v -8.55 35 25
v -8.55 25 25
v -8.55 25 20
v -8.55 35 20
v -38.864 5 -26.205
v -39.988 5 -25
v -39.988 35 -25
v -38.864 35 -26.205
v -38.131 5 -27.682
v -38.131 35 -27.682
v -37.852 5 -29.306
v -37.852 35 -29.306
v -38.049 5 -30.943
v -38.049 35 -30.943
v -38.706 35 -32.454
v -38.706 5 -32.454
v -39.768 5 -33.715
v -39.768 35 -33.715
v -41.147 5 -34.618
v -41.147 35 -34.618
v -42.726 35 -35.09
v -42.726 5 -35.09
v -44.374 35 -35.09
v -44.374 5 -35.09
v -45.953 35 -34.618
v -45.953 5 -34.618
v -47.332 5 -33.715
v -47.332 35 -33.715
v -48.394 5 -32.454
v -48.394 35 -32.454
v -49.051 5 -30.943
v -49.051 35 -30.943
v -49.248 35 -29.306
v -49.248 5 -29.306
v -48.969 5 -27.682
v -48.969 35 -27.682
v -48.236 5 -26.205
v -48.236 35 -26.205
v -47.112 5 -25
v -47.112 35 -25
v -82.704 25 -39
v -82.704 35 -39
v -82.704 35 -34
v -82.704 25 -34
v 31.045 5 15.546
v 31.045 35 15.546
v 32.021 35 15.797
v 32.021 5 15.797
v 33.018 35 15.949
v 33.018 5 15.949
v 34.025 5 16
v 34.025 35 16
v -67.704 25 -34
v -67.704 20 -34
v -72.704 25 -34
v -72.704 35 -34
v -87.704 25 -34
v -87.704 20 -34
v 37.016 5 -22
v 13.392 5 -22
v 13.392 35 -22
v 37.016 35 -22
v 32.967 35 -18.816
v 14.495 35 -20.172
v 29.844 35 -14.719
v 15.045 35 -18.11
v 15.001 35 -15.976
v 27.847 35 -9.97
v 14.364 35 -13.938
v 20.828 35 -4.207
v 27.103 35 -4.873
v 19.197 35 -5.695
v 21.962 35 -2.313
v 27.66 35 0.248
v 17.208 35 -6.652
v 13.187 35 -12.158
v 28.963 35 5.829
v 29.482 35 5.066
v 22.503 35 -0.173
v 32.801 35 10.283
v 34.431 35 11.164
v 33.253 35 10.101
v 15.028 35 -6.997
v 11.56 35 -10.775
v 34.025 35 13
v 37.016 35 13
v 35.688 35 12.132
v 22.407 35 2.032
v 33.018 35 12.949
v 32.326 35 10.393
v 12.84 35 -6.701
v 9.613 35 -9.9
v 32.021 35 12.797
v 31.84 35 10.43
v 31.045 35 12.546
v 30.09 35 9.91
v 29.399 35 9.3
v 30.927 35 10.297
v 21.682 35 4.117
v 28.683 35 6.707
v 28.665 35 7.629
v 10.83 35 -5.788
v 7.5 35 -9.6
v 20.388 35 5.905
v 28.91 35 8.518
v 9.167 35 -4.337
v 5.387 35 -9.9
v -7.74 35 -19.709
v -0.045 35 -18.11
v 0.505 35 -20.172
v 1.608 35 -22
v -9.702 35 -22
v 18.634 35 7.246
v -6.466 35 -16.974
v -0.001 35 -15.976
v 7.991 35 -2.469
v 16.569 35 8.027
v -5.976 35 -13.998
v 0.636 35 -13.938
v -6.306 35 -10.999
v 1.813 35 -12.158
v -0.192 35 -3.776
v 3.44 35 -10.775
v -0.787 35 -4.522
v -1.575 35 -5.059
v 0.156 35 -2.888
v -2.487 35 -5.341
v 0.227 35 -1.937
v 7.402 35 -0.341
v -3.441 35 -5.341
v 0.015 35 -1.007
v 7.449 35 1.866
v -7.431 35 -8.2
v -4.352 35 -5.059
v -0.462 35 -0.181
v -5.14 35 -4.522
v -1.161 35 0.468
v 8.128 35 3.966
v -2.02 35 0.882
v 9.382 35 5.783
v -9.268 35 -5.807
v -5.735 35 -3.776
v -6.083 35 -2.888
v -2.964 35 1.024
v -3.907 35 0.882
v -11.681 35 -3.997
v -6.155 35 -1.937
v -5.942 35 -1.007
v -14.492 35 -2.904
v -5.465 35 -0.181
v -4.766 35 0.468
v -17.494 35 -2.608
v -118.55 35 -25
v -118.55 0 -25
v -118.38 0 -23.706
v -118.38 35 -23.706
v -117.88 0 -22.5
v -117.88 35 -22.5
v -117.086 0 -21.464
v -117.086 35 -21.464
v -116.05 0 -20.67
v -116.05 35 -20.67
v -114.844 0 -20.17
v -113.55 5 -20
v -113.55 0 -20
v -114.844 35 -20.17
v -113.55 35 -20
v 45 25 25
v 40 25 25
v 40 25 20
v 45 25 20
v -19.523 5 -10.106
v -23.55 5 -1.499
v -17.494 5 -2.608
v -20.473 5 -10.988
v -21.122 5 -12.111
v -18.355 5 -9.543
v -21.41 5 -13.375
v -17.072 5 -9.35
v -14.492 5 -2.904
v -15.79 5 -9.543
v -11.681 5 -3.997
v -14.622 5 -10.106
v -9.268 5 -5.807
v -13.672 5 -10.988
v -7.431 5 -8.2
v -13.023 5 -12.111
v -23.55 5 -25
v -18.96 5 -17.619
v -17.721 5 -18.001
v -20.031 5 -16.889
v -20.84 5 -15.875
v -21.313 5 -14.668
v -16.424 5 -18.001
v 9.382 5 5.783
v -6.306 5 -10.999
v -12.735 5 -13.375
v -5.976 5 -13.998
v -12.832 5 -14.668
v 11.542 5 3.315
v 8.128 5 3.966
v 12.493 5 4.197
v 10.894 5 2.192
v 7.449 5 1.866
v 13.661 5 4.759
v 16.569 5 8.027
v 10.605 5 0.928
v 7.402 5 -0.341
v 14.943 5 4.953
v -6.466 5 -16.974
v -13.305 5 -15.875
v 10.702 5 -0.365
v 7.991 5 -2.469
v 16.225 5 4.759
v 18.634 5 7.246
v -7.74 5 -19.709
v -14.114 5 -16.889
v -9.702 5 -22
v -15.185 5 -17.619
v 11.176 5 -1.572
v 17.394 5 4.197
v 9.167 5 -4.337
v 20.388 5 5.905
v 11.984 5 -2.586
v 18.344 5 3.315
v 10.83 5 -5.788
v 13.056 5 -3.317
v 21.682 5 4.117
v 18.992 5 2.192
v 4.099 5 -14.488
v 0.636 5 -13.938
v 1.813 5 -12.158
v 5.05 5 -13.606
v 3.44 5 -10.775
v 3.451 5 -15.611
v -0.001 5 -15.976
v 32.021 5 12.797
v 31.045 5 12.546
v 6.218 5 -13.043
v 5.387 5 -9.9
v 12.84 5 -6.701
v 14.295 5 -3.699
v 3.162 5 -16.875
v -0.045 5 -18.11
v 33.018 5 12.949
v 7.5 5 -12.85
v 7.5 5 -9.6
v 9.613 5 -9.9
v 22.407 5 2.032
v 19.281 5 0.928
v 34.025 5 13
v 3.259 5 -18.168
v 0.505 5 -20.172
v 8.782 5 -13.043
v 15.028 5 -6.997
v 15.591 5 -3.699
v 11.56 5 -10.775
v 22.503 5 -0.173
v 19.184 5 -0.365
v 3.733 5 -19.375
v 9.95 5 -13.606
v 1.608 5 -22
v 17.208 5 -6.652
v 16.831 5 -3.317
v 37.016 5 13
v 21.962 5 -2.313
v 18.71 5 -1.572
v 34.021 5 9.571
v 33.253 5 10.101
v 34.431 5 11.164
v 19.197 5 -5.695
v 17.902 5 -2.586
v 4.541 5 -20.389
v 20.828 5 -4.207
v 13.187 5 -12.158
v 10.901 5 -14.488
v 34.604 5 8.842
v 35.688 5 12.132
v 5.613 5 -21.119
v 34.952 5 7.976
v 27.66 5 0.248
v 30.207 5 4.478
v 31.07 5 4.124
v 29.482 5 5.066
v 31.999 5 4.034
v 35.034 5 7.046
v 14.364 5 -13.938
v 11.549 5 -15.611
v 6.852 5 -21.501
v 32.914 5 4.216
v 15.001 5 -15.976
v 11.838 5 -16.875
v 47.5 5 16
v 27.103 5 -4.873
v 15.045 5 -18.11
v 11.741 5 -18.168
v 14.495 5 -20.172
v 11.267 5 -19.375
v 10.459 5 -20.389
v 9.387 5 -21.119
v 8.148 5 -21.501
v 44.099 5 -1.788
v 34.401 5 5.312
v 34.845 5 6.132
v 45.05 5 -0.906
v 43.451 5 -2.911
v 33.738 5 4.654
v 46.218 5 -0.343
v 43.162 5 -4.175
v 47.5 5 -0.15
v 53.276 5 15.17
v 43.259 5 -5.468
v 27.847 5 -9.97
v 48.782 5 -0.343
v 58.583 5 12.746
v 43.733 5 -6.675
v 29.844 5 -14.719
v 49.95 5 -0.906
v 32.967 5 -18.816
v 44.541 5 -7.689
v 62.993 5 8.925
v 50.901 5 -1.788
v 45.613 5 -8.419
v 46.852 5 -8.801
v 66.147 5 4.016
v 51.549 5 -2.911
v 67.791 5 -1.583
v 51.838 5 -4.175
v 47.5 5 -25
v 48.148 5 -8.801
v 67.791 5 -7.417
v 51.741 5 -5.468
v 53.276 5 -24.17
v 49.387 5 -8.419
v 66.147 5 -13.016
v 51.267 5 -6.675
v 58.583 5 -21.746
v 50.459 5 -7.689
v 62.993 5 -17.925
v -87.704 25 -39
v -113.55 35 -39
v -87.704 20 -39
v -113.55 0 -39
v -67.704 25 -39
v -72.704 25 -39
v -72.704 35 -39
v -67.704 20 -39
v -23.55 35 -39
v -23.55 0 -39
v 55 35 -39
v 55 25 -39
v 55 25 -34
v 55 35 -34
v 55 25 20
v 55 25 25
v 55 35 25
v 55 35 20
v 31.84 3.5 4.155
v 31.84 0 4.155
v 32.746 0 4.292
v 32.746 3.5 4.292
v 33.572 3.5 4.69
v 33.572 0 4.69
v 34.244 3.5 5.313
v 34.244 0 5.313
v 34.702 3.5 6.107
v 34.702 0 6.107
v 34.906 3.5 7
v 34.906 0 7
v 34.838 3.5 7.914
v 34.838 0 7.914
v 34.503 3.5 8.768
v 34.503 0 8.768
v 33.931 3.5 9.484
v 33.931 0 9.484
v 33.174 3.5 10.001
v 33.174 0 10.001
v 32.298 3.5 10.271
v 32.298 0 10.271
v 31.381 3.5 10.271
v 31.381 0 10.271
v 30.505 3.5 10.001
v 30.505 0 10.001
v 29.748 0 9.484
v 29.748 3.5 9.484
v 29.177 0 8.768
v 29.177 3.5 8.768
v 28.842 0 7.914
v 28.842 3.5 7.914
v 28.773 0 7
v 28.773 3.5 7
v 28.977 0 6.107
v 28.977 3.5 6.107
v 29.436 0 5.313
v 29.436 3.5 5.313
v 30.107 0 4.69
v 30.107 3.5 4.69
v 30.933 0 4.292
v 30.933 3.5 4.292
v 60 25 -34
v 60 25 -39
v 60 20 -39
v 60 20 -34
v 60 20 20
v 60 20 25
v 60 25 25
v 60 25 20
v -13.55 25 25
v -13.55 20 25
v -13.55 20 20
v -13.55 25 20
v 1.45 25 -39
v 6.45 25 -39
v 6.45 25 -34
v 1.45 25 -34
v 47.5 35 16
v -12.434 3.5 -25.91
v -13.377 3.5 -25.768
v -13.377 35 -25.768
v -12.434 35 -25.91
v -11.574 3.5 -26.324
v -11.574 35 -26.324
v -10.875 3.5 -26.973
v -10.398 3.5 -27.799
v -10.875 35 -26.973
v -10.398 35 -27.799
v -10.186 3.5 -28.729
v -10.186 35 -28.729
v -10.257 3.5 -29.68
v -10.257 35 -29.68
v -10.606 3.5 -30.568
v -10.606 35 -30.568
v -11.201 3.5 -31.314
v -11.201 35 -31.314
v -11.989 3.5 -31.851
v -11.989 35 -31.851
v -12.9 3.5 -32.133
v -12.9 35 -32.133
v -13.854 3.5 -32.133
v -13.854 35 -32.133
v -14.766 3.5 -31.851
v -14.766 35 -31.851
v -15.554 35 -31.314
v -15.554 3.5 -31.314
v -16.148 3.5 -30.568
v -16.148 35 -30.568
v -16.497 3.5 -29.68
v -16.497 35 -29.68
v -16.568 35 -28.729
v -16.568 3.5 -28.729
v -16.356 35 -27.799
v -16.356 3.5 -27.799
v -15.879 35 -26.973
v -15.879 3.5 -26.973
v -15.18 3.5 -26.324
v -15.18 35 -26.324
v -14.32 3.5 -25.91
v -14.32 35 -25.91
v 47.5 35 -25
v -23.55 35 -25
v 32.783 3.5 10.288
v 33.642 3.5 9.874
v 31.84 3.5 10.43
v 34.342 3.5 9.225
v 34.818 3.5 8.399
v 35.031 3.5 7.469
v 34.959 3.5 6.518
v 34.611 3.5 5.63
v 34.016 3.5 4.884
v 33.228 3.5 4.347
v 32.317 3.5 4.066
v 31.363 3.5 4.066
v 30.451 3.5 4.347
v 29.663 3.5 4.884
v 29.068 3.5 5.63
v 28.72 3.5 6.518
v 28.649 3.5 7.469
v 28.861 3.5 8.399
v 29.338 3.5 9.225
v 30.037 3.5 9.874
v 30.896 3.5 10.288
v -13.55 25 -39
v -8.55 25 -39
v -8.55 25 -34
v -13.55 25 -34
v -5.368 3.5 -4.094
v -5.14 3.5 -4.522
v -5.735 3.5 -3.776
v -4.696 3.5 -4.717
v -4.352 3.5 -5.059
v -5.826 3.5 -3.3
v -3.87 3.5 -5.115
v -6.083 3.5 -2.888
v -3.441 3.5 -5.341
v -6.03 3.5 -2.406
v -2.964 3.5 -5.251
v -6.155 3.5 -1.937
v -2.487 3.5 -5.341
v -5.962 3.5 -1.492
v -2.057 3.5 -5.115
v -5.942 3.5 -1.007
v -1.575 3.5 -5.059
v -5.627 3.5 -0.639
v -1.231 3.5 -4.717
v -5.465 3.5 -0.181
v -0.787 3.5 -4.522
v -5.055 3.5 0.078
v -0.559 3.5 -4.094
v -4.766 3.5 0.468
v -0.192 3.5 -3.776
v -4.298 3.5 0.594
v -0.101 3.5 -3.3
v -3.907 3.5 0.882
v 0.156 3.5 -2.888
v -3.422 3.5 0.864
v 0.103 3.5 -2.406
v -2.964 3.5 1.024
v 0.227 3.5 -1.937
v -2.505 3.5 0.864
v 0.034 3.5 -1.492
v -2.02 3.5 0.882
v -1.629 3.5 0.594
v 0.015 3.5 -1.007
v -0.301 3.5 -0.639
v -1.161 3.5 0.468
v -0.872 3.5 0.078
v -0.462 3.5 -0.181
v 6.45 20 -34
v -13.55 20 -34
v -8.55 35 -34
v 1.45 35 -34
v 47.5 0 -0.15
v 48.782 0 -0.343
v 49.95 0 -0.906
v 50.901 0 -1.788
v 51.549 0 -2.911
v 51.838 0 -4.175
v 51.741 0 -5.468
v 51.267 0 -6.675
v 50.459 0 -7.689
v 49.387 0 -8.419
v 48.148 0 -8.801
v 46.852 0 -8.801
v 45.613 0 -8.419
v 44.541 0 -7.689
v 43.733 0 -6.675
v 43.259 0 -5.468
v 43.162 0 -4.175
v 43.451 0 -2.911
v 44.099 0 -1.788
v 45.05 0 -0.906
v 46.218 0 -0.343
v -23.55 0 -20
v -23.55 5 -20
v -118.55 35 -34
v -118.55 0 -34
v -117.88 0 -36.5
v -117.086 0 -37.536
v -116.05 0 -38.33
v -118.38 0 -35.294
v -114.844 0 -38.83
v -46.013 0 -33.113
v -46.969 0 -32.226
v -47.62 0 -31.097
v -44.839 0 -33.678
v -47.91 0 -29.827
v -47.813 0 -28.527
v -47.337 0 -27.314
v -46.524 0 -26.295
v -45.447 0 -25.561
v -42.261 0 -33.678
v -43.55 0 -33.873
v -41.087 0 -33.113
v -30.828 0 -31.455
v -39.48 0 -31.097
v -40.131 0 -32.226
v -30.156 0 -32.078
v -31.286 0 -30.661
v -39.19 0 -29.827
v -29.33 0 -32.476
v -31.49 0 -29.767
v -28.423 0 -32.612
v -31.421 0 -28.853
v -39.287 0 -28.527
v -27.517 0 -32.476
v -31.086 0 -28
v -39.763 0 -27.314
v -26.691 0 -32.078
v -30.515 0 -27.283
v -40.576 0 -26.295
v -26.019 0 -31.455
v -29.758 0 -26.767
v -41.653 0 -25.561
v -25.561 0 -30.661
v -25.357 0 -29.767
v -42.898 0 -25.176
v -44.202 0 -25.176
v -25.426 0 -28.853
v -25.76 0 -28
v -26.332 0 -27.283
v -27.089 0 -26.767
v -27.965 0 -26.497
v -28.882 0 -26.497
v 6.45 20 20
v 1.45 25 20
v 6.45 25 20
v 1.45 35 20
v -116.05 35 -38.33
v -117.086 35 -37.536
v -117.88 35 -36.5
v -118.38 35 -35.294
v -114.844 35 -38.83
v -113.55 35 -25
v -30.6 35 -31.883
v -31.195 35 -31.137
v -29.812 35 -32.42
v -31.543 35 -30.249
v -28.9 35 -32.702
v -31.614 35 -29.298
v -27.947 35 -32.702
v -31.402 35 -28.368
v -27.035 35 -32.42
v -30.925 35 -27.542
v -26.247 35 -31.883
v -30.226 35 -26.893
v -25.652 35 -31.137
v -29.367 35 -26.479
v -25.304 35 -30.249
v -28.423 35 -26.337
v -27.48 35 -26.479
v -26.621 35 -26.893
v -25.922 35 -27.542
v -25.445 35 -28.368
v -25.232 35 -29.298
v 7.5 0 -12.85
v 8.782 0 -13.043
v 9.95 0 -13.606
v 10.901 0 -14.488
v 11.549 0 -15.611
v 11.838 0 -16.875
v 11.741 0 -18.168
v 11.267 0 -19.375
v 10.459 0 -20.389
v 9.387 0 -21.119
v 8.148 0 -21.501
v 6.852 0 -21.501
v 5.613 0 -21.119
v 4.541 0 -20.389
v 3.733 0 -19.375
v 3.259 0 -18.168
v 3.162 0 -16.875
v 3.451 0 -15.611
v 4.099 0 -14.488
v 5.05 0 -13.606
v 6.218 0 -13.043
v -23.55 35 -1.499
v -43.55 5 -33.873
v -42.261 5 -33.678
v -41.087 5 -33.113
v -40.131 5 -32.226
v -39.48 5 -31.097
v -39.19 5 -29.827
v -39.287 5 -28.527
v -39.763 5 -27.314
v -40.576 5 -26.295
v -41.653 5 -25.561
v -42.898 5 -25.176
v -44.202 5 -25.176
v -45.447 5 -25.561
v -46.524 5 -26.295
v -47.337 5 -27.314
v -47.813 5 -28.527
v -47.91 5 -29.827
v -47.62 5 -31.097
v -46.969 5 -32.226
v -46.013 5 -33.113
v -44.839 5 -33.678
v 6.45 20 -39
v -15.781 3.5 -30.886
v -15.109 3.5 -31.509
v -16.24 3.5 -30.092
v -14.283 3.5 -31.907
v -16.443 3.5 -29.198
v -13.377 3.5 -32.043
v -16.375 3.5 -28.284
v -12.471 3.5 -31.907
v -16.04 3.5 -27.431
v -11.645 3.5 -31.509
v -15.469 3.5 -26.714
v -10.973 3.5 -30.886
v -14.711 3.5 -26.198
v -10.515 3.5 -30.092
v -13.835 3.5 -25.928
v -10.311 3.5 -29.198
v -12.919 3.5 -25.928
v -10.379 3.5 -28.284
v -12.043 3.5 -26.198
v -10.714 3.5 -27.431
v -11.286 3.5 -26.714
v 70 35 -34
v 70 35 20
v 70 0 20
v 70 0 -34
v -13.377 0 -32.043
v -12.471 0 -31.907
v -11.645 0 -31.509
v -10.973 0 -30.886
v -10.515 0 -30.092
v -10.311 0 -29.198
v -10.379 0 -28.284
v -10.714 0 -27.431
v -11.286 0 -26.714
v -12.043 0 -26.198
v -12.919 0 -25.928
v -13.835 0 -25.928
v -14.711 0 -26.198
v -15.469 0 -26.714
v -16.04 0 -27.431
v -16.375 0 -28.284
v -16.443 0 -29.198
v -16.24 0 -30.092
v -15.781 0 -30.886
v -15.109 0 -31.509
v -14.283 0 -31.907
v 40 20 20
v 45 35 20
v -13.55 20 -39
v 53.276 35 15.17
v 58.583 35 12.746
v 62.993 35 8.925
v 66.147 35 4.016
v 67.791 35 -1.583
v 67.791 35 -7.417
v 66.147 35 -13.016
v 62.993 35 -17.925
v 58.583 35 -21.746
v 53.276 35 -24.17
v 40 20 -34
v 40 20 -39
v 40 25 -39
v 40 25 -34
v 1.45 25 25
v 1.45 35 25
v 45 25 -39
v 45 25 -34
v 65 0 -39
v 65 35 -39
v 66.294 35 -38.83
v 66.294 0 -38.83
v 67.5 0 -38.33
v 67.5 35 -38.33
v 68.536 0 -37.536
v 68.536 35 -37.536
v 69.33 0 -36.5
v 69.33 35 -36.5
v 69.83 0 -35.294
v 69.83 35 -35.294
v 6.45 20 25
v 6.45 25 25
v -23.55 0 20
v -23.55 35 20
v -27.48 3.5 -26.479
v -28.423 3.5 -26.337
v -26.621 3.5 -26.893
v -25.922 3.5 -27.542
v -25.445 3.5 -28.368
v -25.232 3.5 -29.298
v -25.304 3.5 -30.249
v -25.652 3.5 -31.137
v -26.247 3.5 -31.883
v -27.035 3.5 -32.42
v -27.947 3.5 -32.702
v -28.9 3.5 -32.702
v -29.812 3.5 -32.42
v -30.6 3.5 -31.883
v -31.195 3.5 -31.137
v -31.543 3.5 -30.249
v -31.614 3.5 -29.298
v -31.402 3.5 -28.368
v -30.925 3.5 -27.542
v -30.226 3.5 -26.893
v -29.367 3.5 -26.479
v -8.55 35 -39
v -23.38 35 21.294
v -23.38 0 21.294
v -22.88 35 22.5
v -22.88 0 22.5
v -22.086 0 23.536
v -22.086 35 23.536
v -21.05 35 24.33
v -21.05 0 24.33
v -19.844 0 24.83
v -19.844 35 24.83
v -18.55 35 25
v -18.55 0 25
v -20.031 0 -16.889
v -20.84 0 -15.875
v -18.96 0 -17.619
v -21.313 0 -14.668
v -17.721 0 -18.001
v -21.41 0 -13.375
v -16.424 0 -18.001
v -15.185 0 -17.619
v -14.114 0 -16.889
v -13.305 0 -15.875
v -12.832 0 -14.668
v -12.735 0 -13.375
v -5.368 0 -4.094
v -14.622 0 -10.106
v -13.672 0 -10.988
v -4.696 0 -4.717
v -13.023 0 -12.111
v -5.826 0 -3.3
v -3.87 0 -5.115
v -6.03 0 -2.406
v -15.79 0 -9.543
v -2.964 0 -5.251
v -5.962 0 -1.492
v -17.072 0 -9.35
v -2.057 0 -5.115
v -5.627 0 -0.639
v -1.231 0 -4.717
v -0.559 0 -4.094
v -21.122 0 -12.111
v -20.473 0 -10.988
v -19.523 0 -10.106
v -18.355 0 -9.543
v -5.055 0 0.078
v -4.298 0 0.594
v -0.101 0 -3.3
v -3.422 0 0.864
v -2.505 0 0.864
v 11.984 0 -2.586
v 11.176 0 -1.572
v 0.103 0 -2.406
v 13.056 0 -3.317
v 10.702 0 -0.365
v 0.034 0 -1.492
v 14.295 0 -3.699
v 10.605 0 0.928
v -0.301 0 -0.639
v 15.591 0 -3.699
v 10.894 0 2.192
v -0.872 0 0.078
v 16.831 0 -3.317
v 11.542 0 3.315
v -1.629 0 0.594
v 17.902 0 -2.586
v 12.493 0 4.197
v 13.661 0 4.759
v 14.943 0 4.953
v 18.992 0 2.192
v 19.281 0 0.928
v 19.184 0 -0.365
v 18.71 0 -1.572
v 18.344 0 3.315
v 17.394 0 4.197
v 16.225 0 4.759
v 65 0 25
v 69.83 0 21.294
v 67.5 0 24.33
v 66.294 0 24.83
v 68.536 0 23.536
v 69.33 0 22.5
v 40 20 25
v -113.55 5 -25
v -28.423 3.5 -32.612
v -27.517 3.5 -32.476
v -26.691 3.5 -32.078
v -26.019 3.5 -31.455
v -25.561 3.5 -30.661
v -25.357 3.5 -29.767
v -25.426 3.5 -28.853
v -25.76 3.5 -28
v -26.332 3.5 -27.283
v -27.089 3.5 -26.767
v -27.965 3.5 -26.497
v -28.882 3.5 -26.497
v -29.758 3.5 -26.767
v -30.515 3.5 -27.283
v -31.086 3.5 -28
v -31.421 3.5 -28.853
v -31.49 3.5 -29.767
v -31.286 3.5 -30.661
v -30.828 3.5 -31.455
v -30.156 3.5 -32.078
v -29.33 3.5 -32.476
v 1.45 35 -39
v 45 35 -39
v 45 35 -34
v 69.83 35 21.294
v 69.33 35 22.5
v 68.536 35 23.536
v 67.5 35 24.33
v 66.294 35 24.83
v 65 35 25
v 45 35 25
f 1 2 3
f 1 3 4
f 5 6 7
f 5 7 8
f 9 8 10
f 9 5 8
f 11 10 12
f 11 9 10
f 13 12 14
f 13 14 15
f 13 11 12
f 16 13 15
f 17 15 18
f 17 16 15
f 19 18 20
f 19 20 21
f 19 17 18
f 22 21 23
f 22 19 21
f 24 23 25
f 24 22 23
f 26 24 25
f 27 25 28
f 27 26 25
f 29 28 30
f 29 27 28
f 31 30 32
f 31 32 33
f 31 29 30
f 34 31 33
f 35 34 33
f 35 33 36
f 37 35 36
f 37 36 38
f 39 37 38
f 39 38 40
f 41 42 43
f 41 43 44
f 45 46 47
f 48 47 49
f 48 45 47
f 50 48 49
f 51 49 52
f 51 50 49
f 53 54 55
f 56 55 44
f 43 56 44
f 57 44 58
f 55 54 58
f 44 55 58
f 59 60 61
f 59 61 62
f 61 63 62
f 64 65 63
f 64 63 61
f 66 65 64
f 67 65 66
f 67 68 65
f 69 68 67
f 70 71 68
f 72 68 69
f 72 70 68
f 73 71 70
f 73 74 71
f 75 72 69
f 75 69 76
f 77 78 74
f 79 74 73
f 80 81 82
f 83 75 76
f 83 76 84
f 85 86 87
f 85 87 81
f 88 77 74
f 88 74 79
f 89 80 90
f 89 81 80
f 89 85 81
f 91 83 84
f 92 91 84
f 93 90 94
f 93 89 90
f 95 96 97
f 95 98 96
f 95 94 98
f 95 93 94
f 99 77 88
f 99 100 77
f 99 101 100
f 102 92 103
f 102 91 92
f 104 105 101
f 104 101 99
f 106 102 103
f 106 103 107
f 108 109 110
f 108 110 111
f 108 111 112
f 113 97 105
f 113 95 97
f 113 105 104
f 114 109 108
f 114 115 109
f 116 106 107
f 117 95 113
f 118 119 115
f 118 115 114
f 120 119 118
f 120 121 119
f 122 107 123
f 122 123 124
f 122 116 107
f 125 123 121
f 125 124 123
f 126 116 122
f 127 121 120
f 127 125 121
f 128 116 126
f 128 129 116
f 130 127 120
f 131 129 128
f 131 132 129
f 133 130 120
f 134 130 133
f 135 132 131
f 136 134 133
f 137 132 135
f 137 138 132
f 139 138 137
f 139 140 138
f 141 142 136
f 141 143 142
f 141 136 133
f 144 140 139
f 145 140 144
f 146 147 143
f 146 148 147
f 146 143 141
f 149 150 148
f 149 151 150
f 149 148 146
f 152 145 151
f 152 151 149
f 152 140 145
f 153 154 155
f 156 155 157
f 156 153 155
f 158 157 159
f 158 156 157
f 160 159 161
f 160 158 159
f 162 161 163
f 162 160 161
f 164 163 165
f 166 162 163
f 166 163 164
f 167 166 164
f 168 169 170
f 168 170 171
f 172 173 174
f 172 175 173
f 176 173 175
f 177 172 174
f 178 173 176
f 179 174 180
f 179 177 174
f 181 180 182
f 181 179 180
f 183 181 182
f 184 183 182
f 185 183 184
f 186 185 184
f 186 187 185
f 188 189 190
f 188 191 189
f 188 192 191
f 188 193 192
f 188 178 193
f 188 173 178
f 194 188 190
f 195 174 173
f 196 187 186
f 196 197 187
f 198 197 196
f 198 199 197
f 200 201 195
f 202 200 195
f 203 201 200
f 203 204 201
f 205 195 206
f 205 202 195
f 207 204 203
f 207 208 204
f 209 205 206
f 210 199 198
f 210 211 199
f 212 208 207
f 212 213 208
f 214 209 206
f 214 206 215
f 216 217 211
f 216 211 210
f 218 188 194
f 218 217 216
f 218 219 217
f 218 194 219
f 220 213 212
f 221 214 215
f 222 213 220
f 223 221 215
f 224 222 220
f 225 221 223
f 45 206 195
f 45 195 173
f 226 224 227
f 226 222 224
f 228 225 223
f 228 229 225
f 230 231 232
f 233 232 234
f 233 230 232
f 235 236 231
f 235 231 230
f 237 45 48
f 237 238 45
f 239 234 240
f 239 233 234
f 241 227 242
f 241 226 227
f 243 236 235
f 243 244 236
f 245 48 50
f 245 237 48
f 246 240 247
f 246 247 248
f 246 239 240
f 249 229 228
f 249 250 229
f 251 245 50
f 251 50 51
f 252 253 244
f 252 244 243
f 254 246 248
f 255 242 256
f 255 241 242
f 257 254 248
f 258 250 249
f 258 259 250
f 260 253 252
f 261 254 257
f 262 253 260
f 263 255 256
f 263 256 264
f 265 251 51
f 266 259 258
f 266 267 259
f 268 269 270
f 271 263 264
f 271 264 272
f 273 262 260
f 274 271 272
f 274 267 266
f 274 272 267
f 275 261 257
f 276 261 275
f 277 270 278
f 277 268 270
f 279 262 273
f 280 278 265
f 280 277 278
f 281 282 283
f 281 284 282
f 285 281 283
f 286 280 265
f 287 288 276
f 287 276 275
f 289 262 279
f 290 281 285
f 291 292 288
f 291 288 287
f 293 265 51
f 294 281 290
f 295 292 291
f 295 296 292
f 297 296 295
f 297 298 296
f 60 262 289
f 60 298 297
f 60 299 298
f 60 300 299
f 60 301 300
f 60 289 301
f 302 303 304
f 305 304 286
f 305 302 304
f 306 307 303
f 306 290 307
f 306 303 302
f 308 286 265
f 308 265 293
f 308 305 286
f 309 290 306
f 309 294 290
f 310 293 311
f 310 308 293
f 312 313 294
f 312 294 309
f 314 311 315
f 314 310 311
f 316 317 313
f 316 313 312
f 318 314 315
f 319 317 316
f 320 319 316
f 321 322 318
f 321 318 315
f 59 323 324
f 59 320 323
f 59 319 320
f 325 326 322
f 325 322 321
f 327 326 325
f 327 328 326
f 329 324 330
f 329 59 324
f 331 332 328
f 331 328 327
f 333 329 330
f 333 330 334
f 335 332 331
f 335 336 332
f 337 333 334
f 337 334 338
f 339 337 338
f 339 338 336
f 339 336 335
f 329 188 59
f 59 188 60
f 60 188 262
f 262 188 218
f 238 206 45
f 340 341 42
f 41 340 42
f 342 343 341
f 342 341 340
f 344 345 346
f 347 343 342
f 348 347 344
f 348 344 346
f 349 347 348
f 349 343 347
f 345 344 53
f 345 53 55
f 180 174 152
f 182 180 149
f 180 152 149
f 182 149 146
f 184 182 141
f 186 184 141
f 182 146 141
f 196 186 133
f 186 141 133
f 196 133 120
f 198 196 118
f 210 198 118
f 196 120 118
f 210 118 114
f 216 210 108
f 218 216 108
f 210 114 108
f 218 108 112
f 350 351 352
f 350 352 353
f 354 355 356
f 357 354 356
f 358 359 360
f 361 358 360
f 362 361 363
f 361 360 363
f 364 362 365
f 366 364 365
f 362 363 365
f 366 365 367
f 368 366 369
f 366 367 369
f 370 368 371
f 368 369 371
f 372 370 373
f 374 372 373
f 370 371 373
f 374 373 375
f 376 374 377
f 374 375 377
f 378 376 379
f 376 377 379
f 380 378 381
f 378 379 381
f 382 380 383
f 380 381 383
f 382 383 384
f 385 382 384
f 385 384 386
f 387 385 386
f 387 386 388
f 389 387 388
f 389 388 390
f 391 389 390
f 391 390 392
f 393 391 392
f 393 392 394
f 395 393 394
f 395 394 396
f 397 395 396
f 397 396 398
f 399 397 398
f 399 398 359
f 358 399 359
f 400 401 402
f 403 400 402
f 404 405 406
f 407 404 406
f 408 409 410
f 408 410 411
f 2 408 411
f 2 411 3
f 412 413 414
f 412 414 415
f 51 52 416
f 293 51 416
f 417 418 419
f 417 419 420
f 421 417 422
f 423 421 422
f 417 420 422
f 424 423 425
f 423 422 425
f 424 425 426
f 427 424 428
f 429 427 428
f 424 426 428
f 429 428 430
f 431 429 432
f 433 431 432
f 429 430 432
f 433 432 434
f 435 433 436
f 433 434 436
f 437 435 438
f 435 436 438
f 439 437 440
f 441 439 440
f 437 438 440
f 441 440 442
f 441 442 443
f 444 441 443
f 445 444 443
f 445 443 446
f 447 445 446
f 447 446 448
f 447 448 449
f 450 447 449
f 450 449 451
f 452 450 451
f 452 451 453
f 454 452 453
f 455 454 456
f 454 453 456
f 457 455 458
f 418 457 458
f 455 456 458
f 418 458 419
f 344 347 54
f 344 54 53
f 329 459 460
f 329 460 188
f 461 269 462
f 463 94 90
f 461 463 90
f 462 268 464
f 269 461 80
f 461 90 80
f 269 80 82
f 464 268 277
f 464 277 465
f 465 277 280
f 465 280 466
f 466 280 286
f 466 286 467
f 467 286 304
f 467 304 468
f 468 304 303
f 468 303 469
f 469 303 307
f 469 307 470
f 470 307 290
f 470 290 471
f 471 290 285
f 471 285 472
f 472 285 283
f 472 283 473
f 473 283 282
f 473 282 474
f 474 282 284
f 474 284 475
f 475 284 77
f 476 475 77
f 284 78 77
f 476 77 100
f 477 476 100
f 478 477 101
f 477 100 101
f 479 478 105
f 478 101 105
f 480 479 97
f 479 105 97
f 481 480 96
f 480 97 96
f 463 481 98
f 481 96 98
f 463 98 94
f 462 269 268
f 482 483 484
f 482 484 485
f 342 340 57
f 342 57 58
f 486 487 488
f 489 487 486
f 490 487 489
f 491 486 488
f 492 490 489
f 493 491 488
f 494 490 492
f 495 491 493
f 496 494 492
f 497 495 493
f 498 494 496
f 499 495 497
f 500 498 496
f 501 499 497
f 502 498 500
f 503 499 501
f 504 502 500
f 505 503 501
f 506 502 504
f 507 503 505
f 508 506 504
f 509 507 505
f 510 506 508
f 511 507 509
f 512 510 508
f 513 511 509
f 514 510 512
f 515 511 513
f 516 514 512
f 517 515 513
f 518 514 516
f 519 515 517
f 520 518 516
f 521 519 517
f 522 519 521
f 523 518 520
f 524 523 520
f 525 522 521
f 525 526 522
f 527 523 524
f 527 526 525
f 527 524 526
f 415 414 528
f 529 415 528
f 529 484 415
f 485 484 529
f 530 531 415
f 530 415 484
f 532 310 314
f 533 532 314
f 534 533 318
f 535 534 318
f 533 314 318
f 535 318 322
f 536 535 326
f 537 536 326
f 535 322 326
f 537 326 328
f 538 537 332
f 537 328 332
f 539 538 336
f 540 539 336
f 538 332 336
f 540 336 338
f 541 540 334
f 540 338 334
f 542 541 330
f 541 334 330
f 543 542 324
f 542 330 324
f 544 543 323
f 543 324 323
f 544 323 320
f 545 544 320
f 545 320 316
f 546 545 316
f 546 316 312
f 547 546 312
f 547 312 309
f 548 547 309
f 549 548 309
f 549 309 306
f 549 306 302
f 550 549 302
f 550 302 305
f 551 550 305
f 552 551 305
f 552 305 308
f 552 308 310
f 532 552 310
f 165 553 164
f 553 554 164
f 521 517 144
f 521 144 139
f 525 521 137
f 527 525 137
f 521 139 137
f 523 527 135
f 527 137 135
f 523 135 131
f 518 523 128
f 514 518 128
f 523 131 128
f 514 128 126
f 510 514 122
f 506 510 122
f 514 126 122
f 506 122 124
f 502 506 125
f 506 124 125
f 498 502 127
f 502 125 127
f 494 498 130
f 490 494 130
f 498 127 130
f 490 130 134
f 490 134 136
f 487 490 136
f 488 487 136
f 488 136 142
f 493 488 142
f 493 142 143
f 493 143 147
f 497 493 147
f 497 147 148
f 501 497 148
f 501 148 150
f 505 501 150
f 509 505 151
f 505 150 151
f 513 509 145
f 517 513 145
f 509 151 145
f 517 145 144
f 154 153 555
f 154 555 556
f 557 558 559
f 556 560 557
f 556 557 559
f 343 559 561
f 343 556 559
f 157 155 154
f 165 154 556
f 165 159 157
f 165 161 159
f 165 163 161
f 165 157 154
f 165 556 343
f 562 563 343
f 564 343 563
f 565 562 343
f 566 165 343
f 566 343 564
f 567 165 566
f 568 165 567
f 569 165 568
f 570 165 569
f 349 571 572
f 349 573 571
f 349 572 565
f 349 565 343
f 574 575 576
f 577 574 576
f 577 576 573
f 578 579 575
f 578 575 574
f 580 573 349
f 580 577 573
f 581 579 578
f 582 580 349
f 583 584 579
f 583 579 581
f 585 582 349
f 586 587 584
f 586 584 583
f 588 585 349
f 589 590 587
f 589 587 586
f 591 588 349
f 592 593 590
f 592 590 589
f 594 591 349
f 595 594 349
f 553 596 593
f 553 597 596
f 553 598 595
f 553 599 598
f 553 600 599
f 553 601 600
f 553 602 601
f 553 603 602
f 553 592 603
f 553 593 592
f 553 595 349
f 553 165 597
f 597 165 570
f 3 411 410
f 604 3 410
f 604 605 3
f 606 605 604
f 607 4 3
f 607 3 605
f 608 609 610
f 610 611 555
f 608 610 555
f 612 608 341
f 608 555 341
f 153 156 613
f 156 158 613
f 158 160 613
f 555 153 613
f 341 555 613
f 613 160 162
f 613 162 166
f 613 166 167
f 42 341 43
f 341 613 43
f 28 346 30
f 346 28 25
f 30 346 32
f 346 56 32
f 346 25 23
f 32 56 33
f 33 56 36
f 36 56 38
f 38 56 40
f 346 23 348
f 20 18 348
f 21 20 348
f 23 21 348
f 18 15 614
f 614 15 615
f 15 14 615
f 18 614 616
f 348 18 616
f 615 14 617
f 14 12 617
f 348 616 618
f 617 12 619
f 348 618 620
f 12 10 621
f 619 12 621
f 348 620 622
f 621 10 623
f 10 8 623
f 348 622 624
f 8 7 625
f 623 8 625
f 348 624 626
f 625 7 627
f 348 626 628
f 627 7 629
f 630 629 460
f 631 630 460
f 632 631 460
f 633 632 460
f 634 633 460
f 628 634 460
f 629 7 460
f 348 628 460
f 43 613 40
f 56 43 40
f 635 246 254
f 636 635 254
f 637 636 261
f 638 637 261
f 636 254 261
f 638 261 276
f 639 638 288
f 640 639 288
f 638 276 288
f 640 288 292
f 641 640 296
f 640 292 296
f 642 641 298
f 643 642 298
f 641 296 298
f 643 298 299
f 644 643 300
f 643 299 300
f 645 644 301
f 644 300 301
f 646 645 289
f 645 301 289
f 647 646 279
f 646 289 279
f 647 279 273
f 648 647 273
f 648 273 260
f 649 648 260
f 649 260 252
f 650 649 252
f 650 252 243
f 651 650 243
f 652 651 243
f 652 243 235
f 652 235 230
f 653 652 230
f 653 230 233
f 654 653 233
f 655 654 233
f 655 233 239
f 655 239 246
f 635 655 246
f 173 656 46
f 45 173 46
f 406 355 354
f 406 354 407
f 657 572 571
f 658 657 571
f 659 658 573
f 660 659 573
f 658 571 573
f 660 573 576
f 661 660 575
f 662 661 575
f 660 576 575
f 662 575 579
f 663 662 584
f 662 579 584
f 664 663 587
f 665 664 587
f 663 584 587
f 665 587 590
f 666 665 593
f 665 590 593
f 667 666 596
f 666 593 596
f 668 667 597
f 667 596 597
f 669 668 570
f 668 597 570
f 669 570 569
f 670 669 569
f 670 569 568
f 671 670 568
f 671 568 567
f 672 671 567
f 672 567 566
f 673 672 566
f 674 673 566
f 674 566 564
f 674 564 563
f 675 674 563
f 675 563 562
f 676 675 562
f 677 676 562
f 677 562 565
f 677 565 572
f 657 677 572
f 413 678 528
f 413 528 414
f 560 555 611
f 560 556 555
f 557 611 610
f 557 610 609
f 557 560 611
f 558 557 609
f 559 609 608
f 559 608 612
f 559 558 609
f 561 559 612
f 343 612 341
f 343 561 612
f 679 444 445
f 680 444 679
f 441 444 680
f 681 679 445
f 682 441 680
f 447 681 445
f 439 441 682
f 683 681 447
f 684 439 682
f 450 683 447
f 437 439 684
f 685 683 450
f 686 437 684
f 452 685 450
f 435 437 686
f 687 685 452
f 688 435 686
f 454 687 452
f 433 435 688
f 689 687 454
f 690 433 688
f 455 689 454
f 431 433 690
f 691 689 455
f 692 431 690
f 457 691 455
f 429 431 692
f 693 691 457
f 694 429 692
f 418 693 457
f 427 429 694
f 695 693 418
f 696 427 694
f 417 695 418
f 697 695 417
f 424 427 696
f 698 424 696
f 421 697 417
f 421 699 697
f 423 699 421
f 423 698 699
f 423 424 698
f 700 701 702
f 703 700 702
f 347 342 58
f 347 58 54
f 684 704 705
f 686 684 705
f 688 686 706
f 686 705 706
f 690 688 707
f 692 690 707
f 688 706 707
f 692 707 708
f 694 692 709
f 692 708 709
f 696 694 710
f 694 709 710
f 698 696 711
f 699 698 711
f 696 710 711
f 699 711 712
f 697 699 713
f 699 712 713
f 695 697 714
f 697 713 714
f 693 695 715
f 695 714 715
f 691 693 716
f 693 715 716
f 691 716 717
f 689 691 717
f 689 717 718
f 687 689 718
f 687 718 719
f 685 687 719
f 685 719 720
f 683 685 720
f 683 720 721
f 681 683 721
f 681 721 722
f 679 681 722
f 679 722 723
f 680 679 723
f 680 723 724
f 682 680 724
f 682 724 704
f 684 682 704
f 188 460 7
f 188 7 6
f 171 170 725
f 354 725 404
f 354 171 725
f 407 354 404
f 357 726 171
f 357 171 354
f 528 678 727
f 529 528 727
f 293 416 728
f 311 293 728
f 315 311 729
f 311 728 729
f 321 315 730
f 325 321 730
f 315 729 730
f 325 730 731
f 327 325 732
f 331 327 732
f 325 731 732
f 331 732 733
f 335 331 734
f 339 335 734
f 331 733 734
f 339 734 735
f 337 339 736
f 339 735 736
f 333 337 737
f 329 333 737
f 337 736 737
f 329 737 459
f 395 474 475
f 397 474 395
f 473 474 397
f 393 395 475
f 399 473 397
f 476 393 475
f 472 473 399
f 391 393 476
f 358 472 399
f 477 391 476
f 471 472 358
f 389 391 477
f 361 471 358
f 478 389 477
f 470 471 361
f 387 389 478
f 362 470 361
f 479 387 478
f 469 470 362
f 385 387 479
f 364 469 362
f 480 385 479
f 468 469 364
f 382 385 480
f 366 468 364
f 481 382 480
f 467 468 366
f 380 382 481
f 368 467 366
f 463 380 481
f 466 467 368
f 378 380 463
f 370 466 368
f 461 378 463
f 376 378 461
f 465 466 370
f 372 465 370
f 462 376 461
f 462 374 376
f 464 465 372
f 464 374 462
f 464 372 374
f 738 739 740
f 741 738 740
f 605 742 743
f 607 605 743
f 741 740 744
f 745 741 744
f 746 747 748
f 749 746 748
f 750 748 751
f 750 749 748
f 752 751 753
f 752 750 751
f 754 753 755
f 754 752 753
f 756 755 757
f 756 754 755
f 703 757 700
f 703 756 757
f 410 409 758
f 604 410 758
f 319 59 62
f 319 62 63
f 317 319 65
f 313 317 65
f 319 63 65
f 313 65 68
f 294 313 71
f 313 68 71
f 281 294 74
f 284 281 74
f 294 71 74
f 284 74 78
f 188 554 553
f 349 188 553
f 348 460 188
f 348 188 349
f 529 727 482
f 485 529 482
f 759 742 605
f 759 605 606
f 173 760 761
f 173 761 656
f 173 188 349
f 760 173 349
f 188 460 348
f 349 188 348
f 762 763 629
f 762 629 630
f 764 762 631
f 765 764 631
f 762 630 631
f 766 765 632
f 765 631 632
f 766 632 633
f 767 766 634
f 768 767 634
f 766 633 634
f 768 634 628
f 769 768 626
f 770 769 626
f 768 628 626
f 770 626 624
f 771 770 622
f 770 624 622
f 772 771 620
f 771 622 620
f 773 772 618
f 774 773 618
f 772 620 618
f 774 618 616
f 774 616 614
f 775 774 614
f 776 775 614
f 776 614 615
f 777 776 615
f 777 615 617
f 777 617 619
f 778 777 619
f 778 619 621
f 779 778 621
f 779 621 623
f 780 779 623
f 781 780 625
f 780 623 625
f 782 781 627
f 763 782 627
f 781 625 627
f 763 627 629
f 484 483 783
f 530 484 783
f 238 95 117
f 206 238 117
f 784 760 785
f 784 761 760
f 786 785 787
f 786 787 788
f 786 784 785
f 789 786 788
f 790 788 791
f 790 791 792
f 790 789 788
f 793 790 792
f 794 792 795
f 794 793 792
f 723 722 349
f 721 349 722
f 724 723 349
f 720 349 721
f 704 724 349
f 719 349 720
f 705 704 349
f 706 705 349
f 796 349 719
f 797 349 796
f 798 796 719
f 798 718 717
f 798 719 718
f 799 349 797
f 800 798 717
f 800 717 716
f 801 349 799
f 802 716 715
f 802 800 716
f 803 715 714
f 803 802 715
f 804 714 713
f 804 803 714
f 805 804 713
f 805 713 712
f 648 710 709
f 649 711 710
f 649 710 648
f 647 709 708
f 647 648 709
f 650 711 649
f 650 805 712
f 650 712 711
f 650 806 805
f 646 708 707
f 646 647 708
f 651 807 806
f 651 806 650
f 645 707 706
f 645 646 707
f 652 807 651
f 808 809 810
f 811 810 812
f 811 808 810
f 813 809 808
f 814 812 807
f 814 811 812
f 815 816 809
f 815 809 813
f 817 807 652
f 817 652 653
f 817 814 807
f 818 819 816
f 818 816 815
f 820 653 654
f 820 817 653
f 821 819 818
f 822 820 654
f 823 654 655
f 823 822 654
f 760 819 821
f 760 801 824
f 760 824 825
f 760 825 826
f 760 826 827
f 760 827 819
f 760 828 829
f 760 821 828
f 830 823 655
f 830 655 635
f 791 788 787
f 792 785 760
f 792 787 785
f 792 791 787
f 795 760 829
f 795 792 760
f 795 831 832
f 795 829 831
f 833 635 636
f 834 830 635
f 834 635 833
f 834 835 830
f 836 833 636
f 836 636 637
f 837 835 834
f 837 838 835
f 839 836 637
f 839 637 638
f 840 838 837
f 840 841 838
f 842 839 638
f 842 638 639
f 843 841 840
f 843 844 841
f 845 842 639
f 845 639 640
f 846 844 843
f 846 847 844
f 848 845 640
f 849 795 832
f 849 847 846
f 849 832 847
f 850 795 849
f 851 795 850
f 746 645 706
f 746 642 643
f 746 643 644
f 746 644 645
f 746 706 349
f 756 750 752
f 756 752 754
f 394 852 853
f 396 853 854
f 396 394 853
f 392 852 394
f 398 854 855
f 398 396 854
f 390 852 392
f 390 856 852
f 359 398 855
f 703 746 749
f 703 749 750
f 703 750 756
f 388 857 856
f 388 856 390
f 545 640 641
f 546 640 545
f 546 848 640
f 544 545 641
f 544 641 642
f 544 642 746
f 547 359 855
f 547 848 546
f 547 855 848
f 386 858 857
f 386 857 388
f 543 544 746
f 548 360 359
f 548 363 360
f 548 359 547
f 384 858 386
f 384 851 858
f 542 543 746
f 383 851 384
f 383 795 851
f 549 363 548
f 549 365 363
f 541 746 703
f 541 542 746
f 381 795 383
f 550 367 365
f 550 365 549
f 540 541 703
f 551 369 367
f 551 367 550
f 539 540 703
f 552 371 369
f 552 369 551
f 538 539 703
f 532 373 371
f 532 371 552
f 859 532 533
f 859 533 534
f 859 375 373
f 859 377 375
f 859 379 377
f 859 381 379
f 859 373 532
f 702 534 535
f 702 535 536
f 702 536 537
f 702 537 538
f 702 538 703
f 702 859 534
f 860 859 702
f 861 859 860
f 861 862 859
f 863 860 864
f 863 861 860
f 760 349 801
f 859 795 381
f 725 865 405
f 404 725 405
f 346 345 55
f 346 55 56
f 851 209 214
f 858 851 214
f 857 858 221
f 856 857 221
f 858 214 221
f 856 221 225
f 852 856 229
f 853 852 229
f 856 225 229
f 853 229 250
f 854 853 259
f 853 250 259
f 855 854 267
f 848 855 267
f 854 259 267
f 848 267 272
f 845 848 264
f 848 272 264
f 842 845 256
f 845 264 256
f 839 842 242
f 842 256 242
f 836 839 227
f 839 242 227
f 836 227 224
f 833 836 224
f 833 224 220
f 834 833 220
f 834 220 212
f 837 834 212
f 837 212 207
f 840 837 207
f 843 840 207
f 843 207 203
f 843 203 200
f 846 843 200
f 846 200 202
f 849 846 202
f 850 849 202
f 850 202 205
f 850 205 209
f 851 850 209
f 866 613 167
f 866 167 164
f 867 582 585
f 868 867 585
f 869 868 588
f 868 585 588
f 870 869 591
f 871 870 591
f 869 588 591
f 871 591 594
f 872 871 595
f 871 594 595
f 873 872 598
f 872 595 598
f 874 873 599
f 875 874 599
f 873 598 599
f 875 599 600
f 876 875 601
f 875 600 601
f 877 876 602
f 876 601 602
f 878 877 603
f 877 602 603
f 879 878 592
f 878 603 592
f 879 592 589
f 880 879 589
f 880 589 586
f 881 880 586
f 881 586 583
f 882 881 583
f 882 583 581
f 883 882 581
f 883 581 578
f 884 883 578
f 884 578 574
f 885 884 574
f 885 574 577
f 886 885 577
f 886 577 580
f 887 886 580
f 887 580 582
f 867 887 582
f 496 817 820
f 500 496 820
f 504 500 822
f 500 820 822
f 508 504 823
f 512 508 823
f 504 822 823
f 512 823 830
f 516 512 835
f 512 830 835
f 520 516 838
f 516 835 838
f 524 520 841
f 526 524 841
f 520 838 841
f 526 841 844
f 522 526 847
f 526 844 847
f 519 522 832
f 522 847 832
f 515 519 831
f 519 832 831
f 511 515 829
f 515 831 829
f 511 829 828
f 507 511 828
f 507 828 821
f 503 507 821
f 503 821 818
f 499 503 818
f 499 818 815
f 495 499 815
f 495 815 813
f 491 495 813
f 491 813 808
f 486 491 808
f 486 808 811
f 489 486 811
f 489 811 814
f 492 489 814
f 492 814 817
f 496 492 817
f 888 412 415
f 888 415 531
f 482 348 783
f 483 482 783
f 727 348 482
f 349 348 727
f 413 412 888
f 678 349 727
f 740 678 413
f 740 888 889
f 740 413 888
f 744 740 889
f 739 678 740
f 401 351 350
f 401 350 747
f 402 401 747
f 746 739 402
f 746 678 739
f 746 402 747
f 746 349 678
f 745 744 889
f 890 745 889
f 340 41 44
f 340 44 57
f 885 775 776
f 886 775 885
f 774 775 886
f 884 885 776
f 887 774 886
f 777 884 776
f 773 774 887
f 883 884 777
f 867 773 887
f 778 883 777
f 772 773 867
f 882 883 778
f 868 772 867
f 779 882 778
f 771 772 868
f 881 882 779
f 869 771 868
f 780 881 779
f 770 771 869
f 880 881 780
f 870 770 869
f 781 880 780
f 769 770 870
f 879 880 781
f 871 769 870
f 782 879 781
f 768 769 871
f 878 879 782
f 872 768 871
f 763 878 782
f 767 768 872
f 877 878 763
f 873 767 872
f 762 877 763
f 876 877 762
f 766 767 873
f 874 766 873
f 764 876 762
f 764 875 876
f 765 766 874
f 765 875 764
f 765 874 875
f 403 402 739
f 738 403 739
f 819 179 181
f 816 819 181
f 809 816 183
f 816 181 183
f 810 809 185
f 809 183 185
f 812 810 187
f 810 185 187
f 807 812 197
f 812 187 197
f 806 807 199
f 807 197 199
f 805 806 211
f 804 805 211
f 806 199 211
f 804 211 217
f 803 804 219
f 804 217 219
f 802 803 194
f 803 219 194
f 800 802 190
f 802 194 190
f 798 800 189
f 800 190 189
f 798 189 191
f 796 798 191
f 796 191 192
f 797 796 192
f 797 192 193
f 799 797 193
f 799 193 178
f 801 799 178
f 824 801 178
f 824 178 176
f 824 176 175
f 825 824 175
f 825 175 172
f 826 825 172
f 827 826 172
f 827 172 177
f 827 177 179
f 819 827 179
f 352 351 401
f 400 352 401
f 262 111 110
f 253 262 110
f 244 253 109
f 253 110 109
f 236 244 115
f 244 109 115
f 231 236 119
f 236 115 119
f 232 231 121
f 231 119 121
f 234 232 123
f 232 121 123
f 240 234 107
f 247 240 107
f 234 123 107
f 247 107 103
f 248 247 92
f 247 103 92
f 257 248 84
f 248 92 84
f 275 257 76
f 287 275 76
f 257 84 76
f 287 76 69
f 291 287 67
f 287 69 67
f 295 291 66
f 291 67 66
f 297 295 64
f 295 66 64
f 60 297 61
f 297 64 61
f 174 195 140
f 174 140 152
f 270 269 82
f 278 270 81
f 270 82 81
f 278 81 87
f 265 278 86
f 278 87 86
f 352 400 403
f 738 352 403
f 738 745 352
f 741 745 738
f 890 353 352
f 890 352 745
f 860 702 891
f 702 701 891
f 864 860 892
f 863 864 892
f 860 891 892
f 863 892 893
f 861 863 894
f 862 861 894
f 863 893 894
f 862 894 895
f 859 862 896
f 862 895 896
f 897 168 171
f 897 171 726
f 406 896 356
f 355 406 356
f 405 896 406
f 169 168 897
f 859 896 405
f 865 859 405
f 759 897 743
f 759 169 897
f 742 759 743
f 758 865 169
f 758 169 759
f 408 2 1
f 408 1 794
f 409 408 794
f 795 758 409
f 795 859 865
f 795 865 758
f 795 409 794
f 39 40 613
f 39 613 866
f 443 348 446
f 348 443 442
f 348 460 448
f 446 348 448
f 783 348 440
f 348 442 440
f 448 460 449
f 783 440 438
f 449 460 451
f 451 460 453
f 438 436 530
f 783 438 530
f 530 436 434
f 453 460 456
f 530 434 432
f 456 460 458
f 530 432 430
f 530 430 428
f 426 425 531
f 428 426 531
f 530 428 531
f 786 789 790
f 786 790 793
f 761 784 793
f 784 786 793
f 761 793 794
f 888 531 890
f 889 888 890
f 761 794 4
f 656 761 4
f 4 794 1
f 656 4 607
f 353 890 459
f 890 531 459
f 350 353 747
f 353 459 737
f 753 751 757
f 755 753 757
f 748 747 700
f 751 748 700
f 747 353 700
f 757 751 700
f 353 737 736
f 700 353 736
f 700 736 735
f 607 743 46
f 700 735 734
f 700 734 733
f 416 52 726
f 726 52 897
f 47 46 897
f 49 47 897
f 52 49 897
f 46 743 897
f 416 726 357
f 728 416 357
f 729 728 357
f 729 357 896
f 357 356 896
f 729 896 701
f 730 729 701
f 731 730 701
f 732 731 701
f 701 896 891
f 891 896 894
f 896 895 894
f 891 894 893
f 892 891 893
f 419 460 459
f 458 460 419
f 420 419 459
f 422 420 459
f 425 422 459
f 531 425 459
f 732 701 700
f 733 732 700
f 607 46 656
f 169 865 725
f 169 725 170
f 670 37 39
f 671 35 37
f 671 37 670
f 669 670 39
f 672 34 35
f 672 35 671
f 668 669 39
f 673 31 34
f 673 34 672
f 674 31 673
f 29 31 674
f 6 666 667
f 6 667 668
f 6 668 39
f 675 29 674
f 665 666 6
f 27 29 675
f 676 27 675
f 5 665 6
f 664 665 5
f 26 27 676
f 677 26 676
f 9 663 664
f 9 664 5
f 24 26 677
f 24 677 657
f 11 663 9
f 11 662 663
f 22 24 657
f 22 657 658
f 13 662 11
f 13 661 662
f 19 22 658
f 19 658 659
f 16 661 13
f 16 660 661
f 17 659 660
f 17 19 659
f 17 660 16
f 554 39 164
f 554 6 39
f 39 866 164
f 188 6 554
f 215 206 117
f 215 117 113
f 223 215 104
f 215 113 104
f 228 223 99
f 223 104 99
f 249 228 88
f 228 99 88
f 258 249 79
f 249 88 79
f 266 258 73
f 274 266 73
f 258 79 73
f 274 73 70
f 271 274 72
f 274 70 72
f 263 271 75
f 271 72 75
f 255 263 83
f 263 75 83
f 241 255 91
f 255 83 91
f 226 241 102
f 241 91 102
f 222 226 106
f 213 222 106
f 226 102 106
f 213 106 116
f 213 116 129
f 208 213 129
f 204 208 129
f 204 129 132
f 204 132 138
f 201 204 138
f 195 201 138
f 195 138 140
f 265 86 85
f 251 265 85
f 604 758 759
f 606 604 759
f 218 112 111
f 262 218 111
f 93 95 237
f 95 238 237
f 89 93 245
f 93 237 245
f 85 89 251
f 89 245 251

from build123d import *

# Parameters (mm, degrees)
SKETCH1_W               = 93.55
SKETCH1_H               = 60
BOSS_EXTRUDE1_DEPTH     = 35
CUT_EXTRUDE1_DEPTH      = 30
FILLET1_R               = 10
SKETCH3_R               = 20.4
SKETCH3_R_2             = 7.6
SKETCH3_R_3             = 11.1
CUT_EXTRUDE2_DEPTH      = 30
CUT_EXTRUDE3_DEPTH      = 30
SKETCH7_R               = 4.35
CUT_EXTRUDE4_DEPTH      = 84.815273071
SKETCH8_W               = 10
SKETCH8_H               = 10
SKETCH8_W_2             = 20
SKETCH8_H_2             = 5
CUT_EXTRUDE5_DEPTH      = 5
SKETCH11_W              = 35
SKETCH11_H              = 10
BOSS_EXTRUDE2_DEPTH     = 95
BOSS_EXTRUDE3_DEPTH     = 5
SKETCH14_W              = 2
SKETCH14_H              = 30
CUT_EXTRUDE7_DEPTH      = 4.45
SKETCH21_W              = 188.55
SKETCH21_H              = 35
BOSS_EXTRUDE4_DEPTH     = 4
CUT_REVOLVE_THIN1_START = 5
CUT_REVOLVE_THIN1_DEPTH = 30
SKETCH18_R              = 4.372505649
CUT_EXTRUDE8_DEPTH      = 130.61520937
CUT_EXTRUDE9_DEPTH      = 5
SKETCH10_W              = 20
SKETCH10_H              = 5
SKETCH10_W_2            = 10
SKETCH10_H_2            = 10
CUT_EXTRUDE6_DEPTH      = 5
FILLET2_R               = 5
SKETCH23_R              = 3.075
CUT_EXTRUDE10_DEPTH     = 130.61520937
SKETCH24_R              = 3.2
CUT_EXTRUDE11_DEPTH     = 31.5
SPLIT1_SURFACE_1_BACK   = 203.169
SPLIT1_SURFACE_1_DEPTH  = 406.338
SPLIT1_SURFACE_2_BACK   = 203.169
SPLIT1_SURFACE_2_DEPTH  = 406.338


# Read off the part's stored shape, not the designer's step: Cut-Revolve-Thin1
with BuildPart() as part:
    # Sketch1 → Boss-Extrude1 (new body)
    with BuildSketch(Plane(origin=(0, 0, 0), x_dir=(-1, 0, 0), z_dir=(0, 1, 0))):
        with Locations((-23.225, -5)):
            Rectangle(SKETCH1_W, SKETCH1_H)
    extrude(amount=BOSS_EXTRUDE1_DEPTH)

    # Sketch2 → Cut-Extrude1 (cut)
    with BuildSketch(Plane(origin=(0, 35, 0), x_dir=(-1, 0, 0), z_dir=(0, 1, 0))):
        with BuildLine():
            Line((23.55, -22), (-47.5, -22))
            ThreePointArc((-47.5, -22), (-65, -4.5), (-47.5, 13))
            Line((-47.5, 13), (-32.5, 13))
            Line((-32.5, 13), (23.55, -4.498536585))
            Line((23.55, -4.498536585), (23.55, -1.498536585))
            Line((23.55, -1.498536585), (-32.5, 16))
            Line((-32.5, 16), (-47.5, 16))
            ThreePointArc((-47.5, 16), (-68, -4.5), (-47.5, -25))
            Line((-47.5, -25), (23.55, -25))
            Line((23.55, -25), (23.55, -22))
        make_face()
    extrude(amount=-CUT_EXTRUDE1_DEPTH, mode=Mode.SUBTRACT)

    # Fillet1
    fillet1_edges = [part.edges().sort_by_distance(p)[0] for p in [
        (32.5, 20, 16),
        (32.5, 20, 13),
    ]]
    fillet(fillet1_edges, radius=FILLET1_R)

    # Sketch3 → Cut-Extrude2 (cut)
    with BuildSketch(Plane(origin=(0, 35, 0), x_dir=(-1, 0, 0), z_dir=(0, 1, 0))):
        with Locations((-47.5, -4.5)):
            Circle(SKETCH3_R)
        with Locations((-7.5, -17.2)):
            Circle(SKETCH3_R_2)
        with Locations((-14.943111192, 0.602558917)):
            Circle(SKETCH3_R_2)
        with Locations((17.072475727, -13.7)):
            Circle(SKETCH3_R_3)
    extrude(amount=-CUT_EXTRUDE2_DEPTH, mode=Mode.SUBTRACT)

    # Sketch4 → Cut-Extrude3 (cut)
    with BuildSketch(Plane(origin=(0, 35, 0), x_dir=(-1, 0, 0), z_dir=(0, 1, 0))):
        Polygon((23.036100787, -4.338099758), (23.55, -4.686028662), (23.55, -4.498536585), align=None)
    extrude(amount=-CUT_EXTRUDE3_DEPTH, mode=Mode.SUBTRACT)

    # Sketch7 → Cut-Extrude4 (cut, through all)
    with BuildSketch(Plane(origin=(0, 5, 0), x_dir=(-1, 0, 0), z_dir=(0, 1, 0))):
        with Locations(Location((-47.5, -4.5, 0), (0, 0, 90))):
            Circle(SKETCH7_R)
        with Locations(Location((-14.943111192, 0.602558917, 0), (0, 0, 90))):
            Circle(SKETCH7_R)
        with Locations(Location((-7.5, -17.2, 0), (0, 0, 90))):
            Circle(SKETCH7_R)
        with Locations(Location((17.072475727, -13.7, 0), (0, 0, 90))):
            Circle(SKETCH7_R)
    extrude(amount=-CUT_EXTRUDE4_DEPTH, mode=Mode.SUBTRACT)

    # Sketch8 → Cut-Extrude5 (cut)
    with BuildSketch(Plane.XY.offset(25)):
        with Locations((50, 30)):
            Rectangle(SKETCH8_W, SKETCH8_H)
        with Locations((50, 22.5)):
            Rectangle(SKETCH8_W_2, SKETCH8_H_2)
        with Locations((-3.55, 22.5)):
            Rectangle(SKETCH8_W_2, SKETCH8_H_2)
        with Locations((-3.55, 30)):
            Rectangle(SKETCH8_W, SKETCH8_H)
    extrude(amount=-CUT_EXTRUDE5_DEPTH, mode=Mode.SUBTRACT)

    # Sketch11 → Boss-Extrude2 (add)
    with BuildSketch(Plane(origin=(-23.55, 0, 0), x_dir=(0, -1, 0), z_dir=(-1, 0, 0))):
        with Locations((-17.5, -30)):
            Rectangle(SKETCH11_W, SKETCH11_H)
    extrude(amount=BOSS_EXTRUDE2_DEPTH)

    # Sketch12 → Boss-Extrude3 (add)
    with BuildSketch(Plane.XY.offset(-25)):
        Polygon((-113.55, 35), (-113.55, 5), (-23.55, 5), (-23.55, 0), (-118.55, 0), (-118.55, 35), align=None)
    extrude(amount=BOSS_EXTRUDE3_DEPTH)

    # Sketch14 → Cut-Extrude7 (cut)
    with BuildSketch(Plane.XY.offset(-25)):
        with Locations((-43.55, 20)):
            Rectangle(SKETCH14_W, SKETCH14_H)
    extrude(amount=-CUT_EXTRUDE7_DEPTH, mode=Mode.SUBTRACT)

    # Sketch21 → Boss-Extrude4 (add)
    with BuildSketch(Plane(origin=(0, 0, -35), x_dir=(1, 0, 0), z_dir=(0, 0, -1))):
        with Locations((-24.275, -17.5)):
            Rectangle(SKETCH21_W, SKETCH21_H)
    extrude(amount=BOSS_EXTRUDE4_DEPTH)

    # Cut-Revolve-Thin1 outline → Cut-Revolve-Thin1 (cut)
    with BuildSketch(Plane(origin=(0, 0, 0), x_dir=(1, 0, 0), z_dir=(0, 1, 0)).offset(CUT_REVOLVE_THIN1_START)):
        with BuildLine():
            ThreePointArc((-39.988048288, 25), (-43.55, 35.15), (-47.111951712, 25))
            Line((-47.111951712, 25), (-44.55, 25))
            Line((-44.55, 25), (-44.55, 29.45))
            Line((-44.55, 29.45), (-42.55, 29.45))
            Line((-42.55, 29.45), (-42.55, 25))
            Line((-42.55, 25), (-39.988048288, 25))
        make_face()
    extrude(amount=CUT_REVOLVE_THIN1_DEPTH, mode=Mode.SUBTRACT)

    # Sketch18 → Cut-Extrude8 (cut, through all)
    with BuildSketch(Plane.XZ):
        with Locations(Location((-43.55, -29.5, 0), (0, 0, 270))):
            Circle(SKETCH18_R)
    extrude(amount=-CUT_EXTRUDE8_DEPTH, mode=Mode.SUBTRACT)

    # Sketch19 → Cut-Extrude9 (cut)
    with BuildSketch(Plane(origin=(0, 0, -39), x_dir=(1, 0, 0), z_dir=(0, 0, -1))):
        Polygon((-87.704165959, -25), (-87.704165959, -20), (-67.704165959, -20), (-67.704165959, -25), (-72.704165959, -25), (-72.704165959, -35), (-82.704165959, -35), (-82.704165959, -25), align=None)
    extrude(amount=-CUT_EXTRUDE9_DEPTH, mode=Mode.SUBTRACT)

    # Sketch10 → Cut-Extrude6 (cut)
    with BuildSketch(Plane(origin=(0, 0, -39), x_dir=(-1, 0, 0), z_dir=(0, 0, -1))):
        with Locations((3.55, 22.5)):
            Rectangle(SKETCH10_W, SKETCH10_H)
        Polygon((-45, 25), (-55, 25), (-60, 25), (-60, 20), (-40, 20), (-40, 25), align=None)
        with Locations((-50, 30)):
            Rectangle(SKETCH10_W_2, SKETCH10_H_2)
        with Locations((3.55, 30)):
            Rectangle(SKETCH10_W_2, SKETCH10_H_2)
    extrude(amount=-CUT_EXTRUDE6_DEPTH, mode=Mode.SUBTRACT)

    # Fillet2
    fillet2_edges = [part.edges().sort_by_distance(p)[0] for p in [
        (-118.55, 17.5, -20),
        (-118.55, 17.5, -39),
        (70, 17.5, -39),
        (-23.55, 17.5, 25),
        (70, 17.5, 25),
    ]]
    fillet(fillet2_edges, radius=FILLET2_R)

    # Sketch23 → Cut-Extrude10 (cut, through all)
    with BuildSketch(Plane.XZ):
        with Locations(Location((-2.9636134, -2.17630607, 0), (0, 0, 270))):
            Circle(SKETCH23_R)
        with Locations(Location((31.83967628, 7.23022785, 0), (0, 0, 270))):
            Circle(SKETCH23_R)
        with Locations(Location((-13.37707505, -28.96832789, 0), (0, 0, 270))):
            Circle(SKETCH23_R)
        with Locations(Location((-28.42344593, -29.5373241, 0), (0, 0, 270))):
            Circle(SKETCH23_R)
    extrude(amount=-CUT_EXTRUDE10_DEPTH, mode=Mode.SUBTRACT)

    # Sketch24 → Cut-Extrude11 (cut)
    with BuildSketch(Plane(origin=(0, 35, 0), x_dir=(-1, 0, 0), z_dir=(0, 1, 0))):
        with Locations(Location((-31.83967628, 7.23022785, 0), (0, 0, 90))):
            Circle(SKETCH24_R)
        with Locations(Location((2.9636134, -2.17630607, 0), (0, 0, 90))):
            Circle(SKETCH24_R)
        with Locations(Location((13.37707505, -28.96832789, 0), (0, 0, 90))):
            Circle(SKETCH24_R)
        with Locations(Location((28.42344593, -29.5373241, 0), (0, 0, 90))):
            Circle(SKETCH24_R)
    extrude(amount=-CUT_EXTRUDE11_DEPTH, mode=Mode.SUBTRACT)


with BuildPart() as body_2:
    # Split1: the piece behind the surface
    add(part.part)
    # Split1 surface: a surface, the sketch's curves swept straight by 406.338 mm
    with BuildLine(Plane(origin=(0, 0, 0), x_dir=(-1, 0, 0), z_dir=(0, -1, 0)).offset(-SPLIT1_SURFACE_1_BACK), mode=Mode.PRIVATE) as split1_surface_1_path:
        Line((23.55, 20), (23.55, 39))
    split1_surface_1 = Shell.extrude(split1_surface_1_path.wire(), (0 * SPLIT1_SURFACE_1_DEPTH, -1 * SPLIT1_SURFACE_1_DEPTH, 0 * SPLIT1_SURFACE_1_DEPTH))
    split(bisect_by=split1_surface_1, keep=Keep.BOTTOM)


with BuildPart() as part_1:
    add(part.part)

    # Split1: split by a surface, the side it looks to stays
    # Split1 surface: a surface, the sketch's curves swept straight by 406.338 mm
    with BuildLine(Plane(origin=(0, 0, 0), x_dir=(-1, 0, 0), z_dir=(0, -1, 0)).offset(-SPLIT1_SURFACE_2_BACK), mode=Mode.PRIVATE) as split1_surface_2_path:
        Line((23.55, 20), (23.55, 39))
    split1_surface_2 = Shell.extrude(split1_surface_2_path.wire(), (0 * SPLIT1_SURFACE_2_DEPTH, -1 * SPLIT1_SURFACE_2_DEPTH, 0 * SPLIT1_SURFACE_2_DEPTH))
    split(bisect_by=split1_surface_2, keep=Keep.TOP)


solid = Compound([body_2.part, part_1.part])
